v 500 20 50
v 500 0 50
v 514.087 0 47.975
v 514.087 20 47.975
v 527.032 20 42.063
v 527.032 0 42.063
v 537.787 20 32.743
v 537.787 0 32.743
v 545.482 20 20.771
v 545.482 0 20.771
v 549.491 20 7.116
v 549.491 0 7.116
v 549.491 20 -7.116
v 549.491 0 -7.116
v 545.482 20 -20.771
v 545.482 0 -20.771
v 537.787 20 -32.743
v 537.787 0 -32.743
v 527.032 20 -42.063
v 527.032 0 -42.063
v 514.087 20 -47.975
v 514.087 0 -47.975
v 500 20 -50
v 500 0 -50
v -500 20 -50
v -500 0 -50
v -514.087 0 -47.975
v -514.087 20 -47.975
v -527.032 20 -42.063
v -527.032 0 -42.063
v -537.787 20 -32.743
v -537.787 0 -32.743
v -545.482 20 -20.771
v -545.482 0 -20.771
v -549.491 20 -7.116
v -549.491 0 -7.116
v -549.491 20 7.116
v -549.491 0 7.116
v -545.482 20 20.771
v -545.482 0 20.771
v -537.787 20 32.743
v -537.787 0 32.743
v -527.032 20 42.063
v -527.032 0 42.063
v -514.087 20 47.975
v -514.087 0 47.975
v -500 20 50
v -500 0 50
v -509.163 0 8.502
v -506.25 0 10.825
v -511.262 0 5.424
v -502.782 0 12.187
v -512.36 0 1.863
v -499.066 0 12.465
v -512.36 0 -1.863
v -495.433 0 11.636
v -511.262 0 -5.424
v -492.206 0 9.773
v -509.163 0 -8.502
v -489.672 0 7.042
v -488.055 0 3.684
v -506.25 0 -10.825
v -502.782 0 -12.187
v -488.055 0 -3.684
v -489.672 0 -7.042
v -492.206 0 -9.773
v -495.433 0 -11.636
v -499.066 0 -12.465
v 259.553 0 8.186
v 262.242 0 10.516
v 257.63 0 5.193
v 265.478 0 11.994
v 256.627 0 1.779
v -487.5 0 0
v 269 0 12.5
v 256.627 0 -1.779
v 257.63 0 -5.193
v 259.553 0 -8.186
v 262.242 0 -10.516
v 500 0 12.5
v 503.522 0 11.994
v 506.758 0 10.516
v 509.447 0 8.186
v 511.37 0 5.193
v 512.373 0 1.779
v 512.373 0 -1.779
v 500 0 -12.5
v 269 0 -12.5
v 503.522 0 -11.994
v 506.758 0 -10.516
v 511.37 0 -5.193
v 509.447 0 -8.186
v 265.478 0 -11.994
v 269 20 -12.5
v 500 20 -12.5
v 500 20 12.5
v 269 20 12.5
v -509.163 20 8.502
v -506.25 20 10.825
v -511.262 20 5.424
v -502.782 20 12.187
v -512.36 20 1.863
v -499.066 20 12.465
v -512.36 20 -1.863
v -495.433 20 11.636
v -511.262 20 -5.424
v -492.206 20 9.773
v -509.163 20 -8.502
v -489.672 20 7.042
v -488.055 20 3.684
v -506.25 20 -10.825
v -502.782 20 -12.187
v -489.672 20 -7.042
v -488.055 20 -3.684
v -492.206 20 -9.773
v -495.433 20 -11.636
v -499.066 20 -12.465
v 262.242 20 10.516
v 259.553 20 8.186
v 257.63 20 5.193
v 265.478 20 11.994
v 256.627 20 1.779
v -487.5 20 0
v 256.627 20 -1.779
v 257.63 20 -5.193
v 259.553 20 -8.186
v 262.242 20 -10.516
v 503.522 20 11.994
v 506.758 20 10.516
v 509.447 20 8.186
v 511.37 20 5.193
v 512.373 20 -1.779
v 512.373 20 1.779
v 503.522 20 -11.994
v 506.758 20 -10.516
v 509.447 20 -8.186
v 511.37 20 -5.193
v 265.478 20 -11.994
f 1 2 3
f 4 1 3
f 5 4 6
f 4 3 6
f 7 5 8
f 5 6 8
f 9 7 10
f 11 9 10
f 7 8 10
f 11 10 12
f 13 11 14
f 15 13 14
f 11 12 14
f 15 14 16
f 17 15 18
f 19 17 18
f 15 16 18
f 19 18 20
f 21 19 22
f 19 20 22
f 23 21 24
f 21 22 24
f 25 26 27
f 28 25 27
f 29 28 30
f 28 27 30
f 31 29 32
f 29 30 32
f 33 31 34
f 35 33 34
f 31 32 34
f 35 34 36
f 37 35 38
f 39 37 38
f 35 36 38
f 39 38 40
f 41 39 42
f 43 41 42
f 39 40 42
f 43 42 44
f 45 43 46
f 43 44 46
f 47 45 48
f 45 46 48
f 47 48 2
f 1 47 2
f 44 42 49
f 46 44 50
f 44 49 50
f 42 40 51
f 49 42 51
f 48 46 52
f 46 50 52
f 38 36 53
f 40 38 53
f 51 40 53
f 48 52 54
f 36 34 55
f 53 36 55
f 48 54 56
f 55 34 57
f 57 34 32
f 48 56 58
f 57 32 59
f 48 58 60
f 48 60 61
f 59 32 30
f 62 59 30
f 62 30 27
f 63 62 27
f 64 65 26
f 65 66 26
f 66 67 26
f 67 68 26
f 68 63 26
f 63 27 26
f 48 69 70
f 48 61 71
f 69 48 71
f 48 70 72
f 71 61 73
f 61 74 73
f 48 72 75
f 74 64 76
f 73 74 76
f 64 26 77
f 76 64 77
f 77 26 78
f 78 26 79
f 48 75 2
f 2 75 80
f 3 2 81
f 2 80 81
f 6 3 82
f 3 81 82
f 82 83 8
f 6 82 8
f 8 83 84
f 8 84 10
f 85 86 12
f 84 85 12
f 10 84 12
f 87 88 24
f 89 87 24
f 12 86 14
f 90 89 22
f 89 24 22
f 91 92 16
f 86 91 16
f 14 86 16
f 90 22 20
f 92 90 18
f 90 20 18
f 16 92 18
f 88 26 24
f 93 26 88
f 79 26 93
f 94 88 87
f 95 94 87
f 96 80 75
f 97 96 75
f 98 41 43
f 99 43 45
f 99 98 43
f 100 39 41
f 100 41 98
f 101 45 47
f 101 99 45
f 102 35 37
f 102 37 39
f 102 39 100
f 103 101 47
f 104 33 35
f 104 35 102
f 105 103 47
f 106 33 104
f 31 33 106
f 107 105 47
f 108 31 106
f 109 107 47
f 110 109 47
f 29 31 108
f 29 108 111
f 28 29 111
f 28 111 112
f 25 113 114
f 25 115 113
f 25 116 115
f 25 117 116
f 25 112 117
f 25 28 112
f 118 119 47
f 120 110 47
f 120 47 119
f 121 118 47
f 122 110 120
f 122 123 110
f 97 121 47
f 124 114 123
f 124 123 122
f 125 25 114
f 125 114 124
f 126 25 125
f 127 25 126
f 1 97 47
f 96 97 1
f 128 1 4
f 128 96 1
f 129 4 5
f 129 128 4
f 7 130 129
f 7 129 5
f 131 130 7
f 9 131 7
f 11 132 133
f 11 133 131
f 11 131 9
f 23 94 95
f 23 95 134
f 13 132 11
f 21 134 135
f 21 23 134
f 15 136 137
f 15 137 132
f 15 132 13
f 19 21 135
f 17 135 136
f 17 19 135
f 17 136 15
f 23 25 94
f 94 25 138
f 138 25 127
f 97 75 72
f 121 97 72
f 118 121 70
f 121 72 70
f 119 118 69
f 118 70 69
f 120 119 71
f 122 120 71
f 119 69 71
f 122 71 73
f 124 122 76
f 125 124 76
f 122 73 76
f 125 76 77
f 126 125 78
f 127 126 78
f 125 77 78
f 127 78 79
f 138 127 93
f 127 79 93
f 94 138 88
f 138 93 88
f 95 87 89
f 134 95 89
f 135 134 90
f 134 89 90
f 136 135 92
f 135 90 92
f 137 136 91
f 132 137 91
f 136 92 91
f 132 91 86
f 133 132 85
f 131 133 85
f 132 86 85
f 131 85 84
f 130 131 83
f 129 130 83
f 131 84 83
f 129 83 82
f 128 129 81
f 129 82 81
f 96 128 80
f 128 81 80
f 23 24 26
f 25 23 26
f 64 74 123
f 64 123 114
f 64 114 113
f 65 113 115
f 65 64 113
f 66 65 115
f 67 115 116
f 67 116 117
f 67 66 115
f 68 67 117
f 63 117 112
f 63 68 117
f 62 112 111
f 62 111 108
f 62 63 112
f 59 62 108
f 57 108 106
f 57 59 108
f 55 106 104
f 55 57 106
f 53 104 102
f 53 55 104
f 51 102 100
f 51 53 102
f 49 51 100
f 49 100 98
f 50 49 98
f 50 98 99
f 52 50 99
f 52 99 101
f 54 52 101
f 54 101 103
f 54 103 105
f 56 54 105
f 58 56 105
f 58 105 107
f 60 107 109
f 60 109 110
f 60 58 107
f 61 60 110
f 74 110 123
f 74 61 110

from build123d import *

# Parameters (mm, degrees)
SKETCH1_R           = 12.5
BOSS_EXTRUDE2_DEPTH = 20


with BuildPart() as part:
    # Sketch1 → Boss-Extrude2 (new body)
    with BuildSketch(Plane(origin=(0, 0, 0), x_dir=(1, 0, 0), z_dir=(0, 1, 0))):
        with BuildLine():
            Line((500, 50), (-500, 50))
            ThreePointArc((-500, 50), (-550, 0), (-500, -50))
            Line((-500, -50), (500, -50))
            ThreePointArc((500, -50), (550, 0), (500, 50))
        make_face()
        with Locations((-500, 0)):
            Circle(SKETCH1_R, mode=Mode.SUBTRACT)
        with BuildLine():
            ThreePointArc((269, -12.5), (256.5, 0), (269, 12.5))
            Line((269, 12.5), (500, 12.5))
            ThreePointArc((500, 12.5), (512.5, 0), (500, -12.5))
            Line((500, -12.5), (269, -12.5))
        make_face(mode=Mode.SUBTRACT)
    extrude(amount=BOSS_EXTRUDE2_DEPTH)


solid = part.part
